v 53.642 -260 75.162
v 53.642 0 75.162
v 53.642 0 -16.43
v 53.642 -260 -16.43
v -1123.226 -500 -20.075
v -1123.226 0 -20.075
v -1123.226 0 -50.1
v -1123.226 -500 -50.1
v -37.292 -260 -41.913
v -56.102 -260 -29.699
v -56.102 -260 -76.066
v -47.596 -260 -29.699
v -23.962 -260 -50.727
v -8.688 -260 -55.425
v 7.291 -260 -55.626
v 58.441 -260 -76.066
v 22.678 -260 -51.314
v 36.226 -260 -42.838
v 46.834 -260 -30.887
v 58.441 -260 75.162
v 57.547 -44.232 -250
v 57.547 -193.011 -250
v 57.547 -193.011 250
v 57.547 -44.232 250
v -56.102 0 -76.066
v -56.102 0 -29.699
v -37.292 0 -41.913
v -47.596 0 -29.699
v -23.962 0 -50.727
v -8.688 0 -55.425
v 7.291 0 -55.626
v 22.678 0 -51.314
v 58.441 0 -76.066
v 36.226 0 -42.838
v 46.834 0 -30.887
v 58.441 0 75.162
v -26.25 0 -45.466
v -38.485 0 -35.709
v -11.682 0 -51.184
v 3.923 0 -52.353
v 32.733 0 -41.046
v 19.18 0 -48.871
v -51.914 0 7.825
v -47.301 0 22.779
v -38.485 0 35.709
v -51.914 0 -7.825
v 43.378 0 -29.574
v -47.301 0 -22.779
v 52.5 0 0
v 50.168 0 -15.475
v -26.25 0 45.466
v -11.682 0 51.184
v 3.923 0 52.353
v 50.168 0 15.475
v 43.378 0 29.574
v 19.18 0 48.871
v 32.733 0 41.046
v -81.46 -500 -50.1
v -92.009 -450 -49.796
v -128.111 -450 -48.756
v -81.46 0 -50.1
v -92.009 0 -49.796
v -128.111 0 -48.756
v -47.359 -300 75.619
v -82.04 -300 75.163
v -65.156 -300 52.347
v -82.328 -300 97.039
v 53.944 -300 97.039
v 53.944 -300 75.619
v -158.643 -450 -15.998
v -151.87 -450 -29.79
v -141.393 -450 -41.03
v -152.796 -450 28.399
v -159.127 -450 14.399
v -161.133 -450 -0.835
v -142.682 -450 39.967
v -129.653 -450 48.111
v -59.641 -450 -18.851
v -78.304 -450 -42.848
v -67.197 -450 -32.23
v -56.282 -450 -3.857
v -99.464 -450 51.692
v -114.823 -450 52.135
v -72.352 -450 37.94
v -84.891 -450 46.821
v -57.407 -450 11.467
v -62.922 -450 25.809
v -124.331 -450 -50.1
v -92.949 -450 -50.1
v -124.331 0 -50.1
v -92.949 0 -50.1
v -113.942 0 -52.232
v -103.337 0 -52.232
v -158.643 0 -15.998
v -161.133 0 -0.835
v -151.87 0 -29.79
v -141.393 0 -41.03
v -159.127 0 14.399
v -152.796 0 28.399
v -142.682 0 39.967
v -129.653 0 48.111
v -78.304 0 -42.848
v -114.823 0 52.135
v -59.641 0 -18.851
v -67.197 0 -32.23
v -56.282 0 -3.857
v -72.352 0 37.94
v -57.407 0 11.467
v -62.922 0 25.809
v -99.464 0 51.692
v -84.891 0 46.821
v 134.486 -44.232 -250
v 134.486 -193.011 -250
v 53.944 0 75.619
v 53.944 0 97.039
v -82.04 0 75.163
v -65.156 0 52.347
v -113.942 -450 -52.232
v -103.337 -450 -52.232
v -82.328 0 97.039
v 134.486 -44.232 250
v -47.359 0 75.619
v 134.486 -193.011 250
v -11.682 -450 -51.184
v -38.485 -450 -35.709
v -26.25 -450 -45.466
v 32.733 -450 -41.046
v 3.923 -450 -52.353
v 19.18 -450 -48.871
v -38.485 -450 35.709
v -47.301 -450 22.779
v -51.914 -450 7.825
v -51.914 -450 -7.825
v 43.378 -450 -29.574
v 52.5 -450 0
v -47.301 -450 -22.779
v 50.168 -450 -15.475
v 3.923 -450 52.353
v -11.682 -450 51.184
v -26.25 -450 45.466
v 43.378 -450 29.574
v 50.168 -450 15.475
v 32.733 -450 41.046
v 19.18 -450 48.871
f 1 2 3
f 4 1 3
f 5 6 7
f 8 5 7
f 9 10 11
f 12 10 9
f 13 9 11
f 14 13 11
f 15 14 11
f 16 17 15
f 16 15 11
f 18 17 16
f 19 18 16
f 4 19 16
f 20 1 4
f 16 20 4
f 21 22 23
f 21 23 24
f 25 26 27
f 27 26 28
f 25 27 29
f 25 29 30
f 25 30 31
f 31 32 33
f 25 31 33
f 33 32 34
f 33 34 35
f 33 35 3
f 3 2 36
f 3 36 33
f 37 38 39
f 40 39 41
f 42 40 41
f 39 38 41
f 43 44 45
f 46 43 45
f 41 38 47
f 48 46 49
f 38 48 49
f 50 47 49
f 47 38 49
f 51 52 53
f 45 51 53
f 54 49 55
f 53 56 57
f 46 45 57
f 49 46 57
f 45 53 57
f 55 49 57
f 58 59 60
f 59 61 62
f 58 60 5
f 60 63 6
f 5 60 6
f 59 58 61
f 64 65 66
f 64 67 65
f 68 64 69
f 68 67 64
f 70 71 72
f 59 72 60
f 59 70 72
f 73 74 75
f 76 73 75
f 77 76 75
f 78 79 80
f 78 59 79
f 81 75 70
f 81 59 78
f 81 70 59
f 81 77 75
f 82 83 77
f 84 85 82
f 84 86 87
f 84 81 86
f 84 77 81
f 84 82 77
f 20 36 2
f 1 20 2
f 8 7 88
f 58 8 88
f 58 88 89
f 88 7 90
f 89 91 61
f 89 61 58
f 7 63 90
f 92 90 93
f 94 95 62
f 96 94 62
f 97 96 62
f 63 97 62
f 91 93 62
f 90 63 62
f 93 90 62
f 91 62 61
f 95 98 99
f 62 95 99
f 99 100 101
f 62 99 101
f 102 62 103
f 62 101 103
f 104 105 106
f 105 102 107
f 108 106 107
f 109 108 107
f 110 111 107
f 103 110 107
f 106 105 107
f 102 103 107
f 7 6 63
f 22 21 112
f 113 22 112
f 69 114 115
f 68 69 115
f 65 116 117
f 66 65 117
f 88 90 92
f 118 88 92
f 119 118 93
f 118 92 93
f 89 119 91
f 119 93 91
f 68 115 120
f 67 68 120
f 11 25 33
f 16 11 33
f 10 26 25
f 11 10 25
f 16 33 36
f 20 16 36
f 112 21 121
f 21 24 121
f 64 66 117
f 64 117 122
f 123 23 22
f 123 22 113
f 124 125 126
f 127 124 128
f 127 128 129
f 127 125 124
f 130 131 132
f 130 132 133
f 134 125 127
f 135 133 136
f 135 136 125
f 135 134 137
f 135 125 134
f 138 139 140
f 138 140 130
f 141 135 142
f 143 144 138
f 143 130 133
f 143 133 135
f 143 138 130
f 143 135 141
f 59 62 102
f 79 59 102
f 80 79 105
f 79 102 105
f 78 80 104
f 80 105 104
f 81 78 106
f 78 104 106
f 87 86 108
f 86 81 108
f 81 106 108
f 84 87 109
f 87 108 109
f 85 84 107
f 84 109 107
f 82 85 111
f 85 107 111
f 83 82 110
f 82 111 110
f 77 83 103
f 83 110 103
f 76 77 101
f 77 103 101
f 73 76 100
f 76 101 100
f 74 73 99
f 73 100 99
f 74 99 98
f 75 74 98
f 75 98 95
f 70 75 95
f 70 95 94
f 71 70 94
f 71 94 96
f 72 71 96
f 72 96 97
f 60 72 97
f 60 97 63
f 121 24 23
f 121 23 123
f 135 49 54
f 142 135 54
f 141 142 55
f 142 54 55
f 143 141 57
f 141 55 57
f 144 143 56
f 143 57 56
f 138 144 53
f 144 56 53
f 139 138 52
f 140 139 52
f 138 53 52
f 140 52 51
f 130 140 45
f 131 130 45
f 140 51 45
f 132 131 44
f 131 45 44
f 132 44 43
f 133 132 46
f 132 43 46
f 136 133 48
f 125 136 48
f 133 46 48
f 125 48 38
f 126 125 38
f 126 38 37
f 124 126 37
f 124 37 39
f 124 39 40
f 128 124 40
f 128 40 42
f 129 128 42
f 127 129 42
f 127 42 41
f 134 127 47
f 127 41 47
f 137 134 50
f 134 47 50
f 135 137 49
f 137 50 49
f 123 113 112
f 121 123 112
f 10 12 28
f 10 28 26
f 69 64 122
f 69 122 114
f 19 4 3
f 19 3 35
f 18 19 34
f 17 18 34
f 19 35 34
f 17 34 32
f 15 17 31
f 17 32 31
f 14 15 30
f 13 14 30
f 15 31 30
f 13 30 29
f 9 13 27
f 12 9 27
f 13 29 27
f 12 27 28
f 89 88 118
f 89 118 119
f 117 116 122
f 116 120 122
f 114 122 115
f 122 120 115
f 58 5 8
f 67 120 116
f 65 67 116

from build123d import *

# Parameters (mm, degrees)
F0_R      = 52.5
F1_DEPTH  = 450
F3_DEPTH  = 260
F4_W      = 76.938853
F4_H      = 148.779336
F5_DEPTH  = 250
F7_DEPTH  = 500
F8_R      = 52.5
F9_DEPTH  = 450
F11_DEPTH = 300


with BuildPart() as f1:
    # F0 (on Front) → F1 (new body)
    with BuildSketch(Plane.XZ):
        Circle(F0_R)
    extrude(amount=F1_DEPTH)


with BuildPart() as f3:
    # F2 (on Front) → F3 (new body)
    with BuildSketch(Plane.XZ):
        with BuildLine():
            Line((-56.102002, -29.698679), (-56.102002, -76.066214))
            Line((-56.102002, -76.066214), (51.897998, -76.066214))
            Line((51.897998, -76.066214), (58.440931, -76.066214))
            Line((58.440931, -76.066214), (58.440931, 74.002035))
            Line((58.440931, 74.002035), (58.440931, 75.161755))
            Line((58.440931, 75.161755), (53.642307, 75.161755))
            Line((53.642307, 75.161755), (53.642307, -16.429774))
            ThreePointArc((53.642307, -16.429774), (7.290681, -55.626258), (-47.596461, -29.698679))
            Line((-47.596461, -29.698679), (-51.849231, -29.698679))
            Line((-51.849231, -29.698679), (-56.102002, -29.698679))
        make_face()
    extrude(amount=F3_DEPTH)


with BuildPart() as f5:
    # F4 (on Top) → F5 (new body, symmetric)
    with BuildSketch(Plane.XY):
        with Locations((96.016667, -118.621303)):
            Rectangle(F4_W, F4_H)
    extrude(amount=F5_DEPTH, both=True)


with BuildPart() as f7:
    # F6 (on Front) → F7 (new body)
    with BuildSketch(Plane.XZ):
        Polygon((-1123.226166, -50.100219), (-81.460141, -50.100219), (-1123.226166, -20.075001), align=None)
    extrude(amount=F7_DEPTH)

    # F8 (on Front) → F9 (join)
    with BuildSketch(Plane.XZ):
        with Locations((-108.63984, 0)):
            Circle(F8_R)
    extrude(amount=F9_DEPTH)


with BuildPart() as f11:
    # F10 (on Front) → F11 (new body)
    with BuildSketch(Plane.XZ):
        Polygon((-47.359243, 75.619392), (-82.03977, 75.16307), (-65.15583, 52.346934), align=None)
        Polygon((-82.327607, 97.038755), (-82.03977, 75.16307), (-47.359243, 75.619392), (53.944398, 75.619392), (53.944398, 97.038755), align=None)
    extrude(amount=F11_DEPTH)


solid = Compound([f1.part, f3.part, f5.part, f7.part, f11.part])
